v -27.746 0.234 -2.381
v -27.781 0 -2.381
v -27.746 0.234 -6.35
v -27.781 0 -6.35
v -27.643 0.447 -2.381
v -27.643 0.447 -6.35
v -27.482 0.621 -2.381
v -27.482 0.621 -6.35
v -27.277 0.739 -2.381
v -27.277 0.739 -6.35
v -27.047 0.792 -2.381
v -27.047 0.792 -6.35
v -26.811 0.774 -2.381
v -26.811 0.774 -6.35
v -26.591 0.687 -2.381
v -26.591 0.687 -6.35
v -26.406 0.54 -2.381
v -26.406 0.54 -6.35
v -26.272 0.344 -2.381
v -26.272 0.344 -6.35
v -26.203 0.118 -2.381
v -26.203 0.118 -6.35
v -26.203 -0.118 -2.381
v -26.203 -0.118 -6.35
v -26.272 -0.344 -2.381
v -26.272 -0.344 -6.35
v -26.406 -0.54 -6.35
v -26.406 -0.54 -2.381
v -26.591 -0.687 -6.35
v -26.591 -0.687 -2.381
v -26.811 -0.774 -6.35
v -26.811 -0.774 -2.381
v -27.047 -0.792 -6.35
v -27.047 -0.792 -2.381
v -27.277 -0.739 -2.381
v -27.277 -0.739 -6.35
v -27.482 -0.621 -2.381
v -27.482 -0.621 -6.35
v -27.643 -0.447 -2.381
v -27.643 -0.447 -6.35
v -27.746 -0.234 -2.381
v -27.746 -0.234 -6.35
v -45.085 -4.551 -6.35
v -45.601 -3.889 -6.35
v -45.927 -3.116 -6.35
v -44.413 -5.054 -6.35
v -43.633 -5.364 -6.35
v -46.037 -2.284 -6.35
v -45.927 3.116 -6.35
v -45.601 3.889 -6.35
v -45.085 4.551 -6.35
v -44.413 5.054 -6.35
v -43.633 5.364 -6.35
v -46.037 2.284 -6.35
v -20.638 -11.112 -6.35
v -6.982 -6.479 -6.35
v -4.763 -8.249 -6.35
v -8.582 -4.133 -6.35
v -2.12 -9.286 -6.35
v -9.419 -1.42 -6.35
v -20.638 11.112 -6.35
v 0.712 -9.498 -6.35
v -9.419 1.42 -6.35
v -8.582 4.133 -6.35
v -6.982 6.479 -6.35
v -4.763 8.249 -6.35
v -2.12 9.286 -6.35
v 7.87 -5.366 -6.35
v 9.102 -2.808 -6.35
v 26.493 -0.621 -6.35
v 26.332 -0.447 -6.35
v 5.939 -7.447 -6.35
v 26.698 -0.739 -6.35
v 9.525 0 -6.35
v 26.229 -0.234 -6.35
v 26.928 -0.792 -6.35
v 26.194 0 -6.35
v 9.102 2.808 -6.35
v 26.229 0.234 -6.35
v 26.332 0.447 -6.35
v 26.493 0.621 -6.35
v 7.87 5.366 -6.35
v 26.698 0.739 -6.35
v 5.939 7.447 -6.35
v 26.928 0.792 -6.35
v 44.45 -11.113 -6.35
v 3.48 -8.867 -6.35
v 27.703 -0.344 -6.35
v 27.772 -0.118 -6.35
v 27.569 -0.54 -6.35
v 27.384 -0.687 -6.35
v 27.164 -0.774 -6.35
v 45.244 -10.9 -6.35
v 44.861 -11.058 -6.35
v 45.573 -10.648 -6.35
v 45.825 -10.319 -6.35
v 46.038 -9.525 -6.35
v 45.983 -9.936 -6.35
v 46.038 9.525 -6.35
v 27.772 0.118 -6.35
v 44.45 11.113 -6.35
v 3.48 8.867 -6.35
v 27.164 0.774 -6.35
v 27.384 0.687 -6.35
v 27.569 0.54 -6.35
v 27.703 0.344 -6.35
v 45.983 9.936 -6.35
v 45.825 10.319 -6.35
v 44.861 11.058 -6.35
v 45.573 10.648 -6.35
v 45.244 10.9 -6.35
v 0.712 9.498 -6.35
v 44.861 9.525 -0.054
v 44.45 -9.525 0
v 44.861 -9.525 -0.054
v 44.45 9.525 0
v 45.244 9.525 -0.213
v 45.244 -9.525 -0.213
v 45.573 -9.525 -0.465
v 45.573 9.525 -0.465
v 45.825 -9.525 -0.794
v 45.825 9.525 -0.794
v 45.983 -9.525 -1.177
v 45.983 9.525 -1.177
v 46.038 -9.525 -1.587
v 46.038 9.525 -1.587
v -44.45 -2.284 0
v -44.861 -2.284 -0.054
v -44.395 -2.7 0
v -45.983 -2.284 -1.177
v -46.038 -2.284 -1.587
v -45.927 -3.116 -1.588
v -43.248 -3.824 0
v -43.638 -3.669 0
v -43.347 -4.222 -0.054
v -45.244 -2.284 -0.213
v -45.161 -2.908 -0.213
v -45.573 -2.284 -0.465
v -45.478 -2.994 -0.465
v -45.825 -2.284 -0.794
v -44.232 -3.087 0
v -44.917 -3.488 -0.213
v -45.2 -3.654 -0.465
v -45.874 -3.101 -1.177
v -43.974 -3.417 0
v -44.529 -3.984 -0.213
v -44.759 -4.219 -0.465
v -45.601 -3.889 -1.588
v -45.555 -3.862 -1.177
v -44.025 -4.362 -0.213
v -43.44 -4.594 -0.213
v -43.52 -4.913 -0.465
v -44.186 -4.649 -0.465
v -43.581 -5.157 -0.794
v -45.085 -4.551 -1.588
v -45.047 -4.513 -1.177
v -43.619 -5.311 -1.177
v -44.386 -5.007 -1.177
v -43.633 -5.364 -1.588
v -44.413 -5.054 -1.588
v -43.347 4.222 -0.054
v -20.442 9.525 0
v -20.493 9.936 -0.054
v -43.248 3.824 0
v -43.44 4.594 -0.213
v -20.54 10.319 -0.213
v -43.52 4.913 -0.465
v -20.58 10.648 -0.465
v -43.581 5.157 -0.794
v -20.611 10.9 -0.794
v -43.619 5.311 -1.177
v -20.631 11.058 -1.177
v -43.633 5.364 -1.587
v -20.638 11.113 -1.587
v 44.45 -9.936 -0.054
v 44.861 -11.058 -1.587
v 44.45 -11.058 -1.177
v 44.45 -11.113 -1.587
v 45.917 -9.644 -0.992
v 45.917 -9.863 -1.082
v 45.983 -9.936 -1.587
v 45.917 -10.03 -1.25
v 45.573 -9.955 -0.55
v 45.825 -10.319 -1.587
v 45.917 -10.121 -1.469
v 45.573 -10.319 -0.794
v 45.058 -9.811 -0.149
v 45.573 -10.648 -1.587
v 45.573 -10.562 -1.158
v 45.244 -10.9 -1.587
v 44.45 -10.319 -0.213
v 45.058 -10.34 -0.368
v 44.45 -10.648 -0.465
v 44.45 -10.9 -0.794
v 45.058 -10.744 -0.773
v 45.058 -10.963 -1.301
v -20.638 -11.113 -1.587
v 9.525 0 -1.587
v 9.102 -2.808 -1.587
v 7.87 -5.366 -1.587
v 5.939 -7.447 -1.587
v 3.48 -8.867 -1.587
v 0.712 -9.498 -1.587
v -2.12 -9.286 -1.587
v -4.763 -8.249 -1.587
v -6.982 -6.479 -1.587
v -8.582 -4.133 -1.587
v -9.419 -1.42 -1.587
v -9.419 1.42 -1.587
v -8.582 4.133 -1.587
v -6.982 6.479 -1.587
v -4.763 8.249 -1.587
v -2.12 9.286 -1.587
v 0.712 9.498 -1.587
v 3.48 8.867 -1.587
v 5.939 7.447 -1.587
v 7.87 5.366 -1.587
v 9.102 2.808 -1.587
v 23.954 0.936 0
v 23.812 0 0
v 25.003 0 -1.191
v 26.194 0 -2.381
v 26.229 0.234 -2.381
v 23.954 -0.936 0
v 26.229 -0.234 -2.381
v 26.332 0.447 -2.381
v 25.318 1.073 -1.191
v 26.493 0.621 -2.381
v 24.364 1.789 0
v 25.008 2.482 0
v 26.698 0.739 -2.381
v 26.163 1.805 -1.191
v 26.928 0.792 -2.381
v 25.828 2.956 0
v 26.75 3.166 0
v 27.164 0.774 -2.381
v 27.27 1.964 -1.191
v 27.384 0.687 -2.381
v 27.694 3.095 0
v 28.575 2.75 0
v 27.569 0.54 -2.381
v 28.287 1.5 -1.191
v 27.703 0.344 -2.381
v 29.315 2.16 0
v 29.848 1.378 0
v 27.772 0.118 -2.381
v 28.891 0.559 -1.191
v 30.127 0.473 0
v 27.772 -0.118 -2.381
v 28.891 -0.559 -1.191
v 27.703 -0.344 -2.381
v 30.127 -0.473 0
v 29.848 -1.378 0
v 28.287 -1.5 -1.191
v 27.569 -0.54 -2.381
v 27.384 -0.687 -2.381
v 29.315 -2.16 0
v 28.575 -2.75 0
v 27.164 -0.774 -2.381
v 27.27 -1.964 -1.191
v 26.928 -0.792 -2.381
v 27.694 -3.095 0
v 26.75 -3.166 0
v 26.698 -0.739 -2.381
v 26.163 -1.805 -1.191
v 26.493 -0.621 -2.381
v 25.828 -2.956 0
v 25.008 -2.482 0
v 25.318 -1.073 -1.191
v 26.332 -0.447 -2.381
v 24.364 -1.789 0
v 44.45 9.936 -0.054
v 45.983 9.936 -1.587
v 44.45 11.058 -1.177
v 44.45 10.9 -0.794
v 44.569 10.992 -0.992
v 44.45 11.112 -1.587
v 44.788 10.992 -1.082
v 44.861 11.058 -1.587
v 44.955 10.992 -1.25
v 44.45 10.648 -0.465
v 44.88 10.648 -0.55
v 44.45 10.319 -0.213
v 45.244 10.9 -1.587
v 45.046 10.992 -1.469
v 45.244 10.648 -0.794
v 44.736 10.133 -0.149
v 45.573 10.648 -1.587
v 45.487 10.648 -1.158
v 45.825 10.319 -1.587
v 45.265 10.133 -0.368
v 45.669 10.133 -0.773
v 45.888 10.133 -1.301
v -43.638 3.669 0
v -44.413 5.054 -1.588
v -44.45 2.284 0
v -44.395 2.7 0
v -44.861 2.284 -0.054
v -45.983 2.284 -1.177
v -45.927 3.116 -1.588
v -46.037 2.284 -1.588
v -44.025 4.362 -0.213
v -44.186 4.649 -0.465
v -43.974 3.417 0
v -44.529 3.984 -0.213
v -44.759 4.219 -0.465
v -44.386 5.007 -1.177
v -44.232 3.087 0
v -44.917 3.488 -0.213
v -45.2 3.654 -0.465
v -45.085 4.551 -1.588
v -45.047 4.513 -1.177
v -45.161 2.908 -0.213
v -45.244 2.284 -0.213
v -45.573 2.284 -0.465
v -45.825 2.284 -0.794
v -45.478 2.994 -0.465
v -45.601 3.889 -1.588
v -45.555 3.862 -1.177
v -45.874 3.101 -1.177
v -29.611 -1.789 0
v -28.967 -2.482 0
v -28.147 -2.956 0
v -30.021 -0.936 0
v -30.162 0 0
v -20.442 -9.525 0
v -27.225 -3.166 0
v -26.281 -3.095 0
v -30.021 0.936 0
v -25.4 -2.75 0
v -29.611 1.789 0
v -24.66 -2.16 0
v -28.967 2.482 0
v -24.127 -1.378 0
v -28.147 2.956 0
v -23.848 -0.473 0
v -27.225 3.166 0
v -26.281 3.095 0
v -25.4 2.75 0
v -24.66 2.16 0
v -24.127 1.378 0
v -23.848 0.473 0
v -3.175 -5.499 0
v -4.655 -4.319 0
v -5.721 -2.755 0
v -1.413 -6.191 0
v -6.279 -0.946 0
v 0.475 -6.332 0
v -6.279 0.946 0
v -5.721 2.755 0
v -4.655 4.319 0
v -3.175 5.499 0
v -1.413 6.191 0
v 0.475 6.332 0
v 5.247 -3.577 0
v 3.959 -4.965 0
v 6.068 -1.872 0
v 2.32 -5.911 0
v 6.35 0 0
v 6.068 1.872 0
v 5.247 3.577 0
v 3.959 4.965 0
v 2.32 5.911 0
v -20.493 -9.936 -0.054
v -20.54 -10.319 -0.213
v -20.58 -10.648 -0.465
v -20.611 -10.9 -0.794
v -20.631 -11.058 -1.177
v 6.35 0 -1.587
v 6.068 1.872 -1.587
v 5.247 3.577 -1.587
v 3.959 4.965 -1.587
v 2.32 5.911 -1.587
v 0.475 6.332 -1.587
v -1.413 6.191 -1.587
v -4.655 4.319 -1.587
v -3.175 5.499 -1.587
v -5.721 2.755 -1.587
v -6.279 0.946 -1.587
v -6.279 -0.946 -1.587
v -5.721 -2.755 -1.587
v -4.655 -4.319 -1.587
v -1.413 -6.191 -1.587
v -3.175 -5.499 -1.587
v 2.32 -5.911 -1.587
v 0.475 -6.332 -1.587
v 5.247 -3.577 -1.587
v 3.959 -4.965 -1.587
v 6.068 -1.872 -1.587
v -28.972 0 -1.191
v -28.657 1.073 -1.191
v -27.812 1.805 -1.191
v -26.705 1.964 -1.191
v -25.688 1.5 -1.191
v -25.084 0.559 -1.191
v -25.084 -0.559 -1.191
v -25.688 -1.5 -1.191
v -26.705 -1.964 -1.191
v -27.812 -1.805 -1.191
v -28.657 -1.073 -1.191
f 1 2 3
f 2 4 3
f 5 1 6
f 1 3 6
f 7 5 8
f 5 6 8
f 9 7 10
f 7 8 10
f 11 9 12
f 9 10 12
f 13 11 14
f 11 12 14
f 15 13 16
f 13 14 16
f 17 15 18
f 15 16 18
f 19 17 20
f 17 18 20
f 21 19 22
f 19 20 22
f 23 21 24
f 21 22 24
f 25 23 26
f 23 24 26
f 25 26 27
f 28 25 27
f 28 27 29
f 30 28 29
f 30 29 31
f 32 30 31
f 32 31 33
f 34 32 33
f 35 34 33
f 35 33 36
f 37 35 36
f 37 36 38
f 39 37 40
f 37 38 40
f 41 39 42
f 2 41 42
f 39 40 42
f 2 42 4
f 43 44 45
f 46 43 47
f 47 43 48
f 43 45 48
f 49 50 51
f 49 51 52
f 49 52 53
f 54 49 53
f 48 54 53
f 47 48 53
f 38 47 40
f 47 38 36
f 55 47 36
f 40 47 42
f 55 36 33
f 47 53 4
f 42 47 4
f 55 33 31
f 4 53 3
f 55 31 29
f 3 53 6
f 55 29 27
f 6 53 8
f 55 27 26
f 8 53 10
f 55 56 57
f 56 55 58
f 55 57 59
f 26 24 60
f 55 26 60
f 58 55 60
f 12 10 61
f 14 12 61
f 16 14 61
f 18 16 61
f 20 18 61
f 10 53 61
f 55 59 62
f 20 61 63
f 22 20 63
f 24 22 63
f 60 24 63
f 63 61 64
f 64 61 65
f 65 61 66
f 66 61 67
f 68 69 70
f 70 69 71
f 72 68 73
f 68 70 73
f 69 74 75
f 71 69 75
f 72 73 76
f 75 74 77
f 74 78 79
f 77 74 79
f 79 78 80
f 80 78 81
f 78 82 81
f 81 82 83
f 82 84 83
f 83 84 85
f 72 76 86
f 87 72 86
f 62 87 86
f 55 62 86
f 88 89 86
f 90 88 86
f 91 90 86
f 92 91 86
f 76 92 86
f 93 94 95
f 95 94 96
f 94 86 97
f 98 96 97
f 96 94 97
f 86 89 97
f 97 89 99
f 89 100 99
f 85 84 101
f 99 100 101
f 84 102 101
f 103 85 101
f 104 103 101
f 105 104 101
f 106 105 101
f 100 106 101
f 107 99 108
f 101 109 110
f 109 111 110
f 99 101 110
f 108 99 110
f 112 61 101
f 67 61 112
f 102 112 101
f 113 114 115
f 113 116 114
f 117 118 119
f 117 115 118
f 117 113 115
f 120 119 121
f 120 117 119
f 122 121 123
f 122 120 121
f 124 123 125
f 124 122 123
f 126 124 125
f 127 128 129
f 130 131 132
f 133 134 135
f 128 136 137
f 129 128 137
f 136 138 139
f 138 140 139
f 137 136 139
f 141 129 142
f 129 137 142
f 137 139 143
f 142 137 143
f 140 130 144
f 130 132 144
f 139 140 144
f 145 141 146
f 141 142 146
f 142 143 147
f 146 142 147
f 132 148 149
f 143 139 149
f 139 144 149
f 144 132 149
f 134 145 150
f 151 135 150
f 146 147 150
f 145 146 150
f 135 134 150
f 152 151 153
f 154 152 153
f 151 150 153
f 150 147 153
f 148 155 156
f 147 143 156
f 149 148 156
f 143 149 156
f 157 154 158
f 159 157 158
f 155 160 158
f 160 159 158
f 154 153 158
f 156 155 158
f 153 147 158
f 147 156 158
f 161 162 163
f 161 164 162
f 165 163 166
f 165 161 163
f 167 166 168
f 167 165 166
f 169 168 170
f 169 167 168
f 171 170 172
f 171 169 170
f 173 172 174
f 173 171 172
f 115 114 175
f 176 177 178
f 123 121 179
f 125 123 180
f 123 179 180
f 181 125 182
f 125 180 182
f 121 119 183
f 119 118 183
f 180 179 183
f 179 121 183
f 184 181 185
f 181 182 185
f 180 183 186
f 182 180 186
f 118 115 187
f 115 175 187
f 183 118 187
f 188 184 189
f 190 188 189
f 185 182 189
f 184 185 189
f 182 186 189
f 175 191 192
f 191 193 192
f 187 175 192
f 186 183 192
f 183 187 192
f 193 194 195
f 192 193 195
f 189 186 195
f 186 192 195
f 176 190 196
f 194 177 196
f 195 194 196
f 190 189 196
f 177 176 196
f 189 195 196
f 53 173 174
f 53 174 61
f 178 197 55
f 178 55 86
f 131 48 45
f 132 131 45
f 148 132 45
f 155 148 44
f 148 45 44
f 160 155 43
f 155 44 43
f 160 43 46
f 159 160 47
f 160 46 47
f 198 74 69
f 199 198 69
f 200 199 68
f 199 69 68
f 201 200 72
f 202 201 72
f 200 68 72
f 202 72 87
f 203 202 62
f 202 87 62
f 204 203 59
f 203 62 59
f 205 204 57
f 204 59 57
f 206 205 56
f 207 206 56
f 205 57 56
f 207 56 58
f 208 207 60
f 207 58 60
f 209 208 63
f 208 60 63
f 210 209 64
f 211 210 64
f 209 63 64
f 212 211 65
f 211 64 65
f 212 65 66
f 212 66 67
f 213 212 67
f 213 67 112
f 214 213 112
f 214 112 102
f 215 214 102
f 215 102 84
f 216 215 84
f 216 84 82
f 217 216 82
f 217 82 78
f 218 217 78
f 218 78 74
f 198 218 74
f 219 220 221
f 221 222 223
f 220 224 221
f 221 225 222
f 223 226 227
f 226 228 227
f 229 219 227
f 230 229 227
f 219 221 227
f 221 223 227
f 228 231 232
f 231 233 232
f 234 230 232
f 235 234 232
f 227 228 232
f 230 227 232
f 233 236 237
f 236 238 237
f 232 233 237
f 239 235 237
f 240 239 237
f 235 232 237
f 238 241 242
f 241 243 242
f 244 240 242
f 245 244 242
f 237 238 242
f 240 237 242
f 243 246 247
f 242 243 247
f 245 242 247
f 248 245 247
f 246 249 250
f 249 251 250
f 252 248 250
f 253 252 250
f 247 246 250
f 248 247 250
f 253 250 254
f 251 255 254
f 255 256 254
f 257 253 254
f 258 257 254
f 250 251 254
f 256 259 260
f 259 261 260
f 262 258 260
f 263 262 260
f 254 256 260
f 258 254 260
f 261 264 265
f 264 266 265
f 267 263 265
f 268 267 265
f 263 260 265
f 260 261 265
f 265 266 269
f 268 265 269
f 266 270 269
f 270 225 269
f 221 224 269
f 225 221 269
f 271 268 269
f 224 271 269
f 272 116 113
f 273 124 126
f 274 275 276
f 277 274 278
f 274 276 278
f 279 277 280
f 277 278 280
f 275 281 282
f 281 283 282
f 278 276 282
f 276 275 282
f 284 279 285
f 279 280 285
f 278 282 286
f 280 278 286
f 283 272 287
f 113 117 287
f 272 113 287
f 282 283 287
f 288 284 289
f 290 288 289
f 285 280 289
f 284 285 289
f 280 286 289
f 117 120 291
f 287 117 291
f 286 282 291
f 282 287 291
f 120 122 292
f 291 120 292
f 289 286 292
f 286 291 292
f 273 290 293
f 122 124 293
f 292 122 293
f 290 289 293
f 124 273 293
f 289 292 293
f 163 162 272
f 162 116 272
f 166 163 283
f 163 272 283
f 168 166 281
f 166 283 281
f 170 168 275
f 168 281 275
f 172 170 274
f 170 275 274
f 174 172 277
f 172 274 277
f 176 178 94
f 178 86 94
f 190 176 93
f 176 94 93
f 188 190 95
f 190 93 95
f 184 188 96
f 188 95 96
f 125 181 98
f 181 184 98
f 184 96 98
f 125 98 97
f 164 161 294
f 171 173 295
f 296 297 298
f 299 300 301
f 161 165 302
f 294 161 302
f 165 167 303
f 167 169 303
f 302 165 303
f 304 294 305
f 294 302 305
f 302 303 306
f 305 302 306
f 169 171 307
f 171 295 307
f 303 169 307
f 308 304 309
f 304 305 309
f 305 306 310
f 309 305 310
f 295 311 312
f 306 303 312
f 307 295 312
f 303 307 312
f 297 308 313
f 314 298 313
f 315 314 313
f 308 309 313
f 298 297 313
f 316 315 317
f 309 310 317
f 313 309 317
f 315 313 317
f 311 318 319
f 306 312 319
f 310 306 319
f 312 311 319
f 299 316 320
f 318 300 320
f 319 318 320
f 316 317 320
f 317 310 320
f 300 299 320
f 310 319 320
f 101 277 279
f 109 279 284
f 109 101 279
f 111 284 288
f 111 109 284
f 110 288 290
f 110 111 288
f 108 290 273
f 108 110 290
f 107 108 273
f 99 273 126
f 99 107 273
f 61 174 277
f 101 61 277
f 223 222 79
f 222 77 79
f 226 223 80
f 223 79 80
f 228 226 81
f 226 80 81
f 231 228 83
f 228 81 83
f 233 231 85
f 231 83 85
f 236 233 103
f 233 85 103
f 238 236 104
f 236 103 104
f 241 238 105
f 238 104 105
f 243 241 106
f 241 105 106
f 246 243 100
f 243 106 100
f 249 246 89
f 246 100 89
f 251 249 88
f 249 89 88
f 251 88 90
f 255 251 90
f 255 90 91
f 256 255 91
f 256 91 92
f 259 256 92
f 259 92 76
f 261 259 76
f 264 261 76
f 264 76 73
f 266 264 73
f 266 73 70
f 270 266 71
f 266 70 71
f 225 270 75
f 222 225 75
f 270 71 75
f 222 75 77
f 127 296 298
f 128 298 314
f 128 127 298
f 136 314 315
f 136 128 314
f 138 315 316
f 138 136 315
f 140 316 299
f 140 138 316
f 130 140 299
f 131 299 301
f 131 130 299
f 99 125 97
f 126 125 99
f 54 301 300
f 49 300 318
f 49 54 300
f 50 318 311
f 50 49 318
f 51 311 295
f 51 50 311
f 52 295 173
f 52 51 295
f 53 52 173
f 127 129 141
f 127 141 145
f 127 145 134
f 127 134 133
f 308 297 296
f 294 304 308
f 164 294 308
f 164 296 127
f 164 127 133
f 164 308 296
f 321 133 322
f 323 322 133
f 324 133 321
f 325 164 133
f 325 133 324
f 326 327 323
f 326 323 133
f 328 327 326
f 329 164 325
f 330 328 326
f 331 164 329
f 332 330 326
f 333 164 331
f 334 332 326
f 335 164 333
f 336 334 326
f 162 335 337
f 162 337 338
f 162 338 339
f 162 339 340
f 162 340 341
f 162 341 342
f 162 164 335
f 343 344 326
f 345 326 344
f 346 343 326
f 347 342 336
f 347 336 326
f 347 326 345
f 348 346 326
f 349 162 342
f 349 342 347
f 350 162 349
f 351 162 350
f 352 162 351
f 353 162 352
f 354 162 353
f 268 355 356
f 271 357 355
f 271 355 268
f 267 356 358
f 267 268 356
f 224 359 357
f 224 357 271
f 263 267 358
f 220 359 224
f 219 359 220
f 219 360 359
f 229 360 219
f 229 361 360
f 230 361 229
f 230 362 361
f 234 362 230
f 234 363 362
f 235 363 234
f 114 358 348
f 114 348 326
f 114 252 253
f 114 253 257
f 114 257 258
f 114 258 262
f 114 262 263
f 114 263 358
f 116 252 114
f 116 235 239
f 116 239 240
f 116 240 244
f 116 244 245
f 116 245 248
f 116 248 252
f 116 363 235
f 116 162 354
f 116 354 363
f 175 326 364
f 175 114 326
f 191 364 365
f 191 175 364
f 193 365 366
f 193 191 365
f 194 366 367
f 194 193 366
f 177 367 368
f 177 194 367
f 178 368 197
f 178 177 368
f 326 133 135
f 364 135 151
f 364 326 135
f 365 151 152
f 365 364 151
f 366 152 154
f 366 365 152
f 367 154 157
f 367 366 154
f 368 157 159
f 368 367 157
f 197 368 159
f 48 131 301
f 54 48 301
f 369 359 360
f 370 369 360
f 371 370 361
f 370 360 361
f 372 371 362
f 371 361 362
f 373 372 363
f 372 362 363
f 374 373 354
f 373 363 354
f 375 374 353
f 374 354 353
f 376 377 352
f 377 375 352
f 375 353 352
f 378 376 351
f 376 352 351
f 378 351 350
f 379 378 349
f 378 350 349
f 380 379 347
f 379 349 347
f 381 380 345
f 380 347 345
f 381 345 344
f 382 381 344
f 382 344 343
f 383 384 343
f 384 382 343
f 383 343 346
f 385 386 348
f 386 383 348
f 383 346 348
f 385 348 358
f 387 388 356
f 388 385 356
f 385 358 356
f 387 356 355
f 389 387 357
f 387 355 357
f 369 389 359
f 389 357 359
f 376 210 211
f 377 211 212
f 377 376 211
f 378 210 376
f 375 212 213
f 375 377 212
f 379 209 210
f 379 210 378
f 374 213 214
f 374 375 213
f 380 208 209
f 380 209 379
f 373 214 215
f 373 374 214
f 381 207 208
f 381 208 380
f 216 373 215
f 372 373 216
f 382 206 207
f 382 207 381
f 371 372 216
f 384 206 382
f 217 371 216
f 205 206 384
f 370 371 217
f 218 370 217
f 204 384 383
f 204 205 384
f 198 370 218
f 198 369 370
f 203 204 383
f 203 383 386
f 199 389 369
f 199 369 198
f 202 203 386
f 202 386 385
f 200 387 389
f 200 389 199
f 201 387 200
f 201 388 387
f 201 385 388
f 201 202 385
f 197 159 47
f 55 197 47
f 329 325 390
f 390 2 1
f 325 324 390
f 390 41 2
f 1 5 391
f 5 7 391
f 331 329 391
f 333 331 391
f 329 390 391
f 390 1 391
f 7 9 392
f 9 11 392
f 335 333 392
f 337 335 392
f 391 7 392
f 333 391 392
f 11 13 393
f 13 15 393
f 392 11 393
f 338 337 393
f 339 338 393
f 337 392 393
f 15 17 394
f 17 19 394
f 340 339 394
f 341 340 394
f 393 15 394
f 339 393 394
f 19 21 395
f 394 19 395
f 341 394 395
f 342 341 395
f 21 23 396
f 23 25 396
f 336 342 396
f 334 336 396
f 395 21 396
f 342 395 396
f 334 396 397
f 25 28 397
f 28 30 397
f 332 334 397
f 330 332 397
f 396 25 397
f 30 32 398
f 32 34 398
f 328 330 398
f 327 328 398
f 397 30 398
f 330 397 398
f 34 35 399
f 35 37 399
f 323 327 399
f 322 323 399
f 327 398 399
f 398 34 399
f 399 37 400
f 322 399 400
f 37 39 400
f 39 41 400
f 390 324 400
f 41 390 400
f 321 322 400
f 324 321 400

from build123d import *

# Parameters (mm, degrees)
F0_W           = 92.075
F0_H           = 22.225
F0_R           = 6.35
F1_DEPTH       = 6.35
F3_D           = 1.5875
F3_CSINK_D     = 6.35
F3_CSINK_ANGLE = 90
F6_D           = 12.7
F6_CBORE_D     = 19.05
F6_CBORE_DEPTH = 4.7625
F7_SIZE2       = 25.4
F7_SIZE        = 6.35
F8_R           = 3.175
F9_R           = 1.5875


with BuildPart() as f1:
    # F0 (on Top) → F1 (new body)
    with BuildSketch(Plane.XY):
        Rectangle(F0_W, F0_H)
        Circle(F0_R, mode=Mode.SUBTRACT)
    extrude(amount=-F1_DEPTH)

    # F3 (through all)
    with Locations(Plane.XY):
        with Locations((26.9875, 0), (-26.9875, 0)):
            CounterSinkHole(F3_D / 2, F3_CSINK_D / 2, counter_sink_angle=F3_CSINK_ANGLE)

    # F6 (through all)
    with Locations(Plane(origin=(0, 0, -6.35), x_dir=(1, 0, 0), z_dir=(0, 0, -1))):
        with Locations((0, 0)):
            CounterBoreHole(F6_D / 2, F6_CBORE_D / 2, F6_CBORE_DEPTH)

    # F7
    f7_edges = [f1.edges().sort_by_distance(p)[0] for p in [
        (-46.0375, -11.1125, -3.175),
        (-46.0375, 11.1125, -3.175),
    ]]
    f7_side = f1.faces().sort_by_distance((-46.0375, 0, -3.175))[0]
    chamfer(f7_edges, length=F7_SIZE, length2=F7_SIZE2, reference=f7_side)

    # F8
    f8_edges = [f1.edges().sort_by_distance(p)[0] for p in [
        (-46.0375, -4.7625, -3.175),
        (-46.0375, 4.7625, -3.175),
    ]]
    fillet(f8_edges, radius=F8_R)

    # F9
    f9_edges = [f1.edges().sort_by_distance(p)[0] for p in [
        (12.7, -11.1125, 0),
        (46.0375, 0, 0),
        (12.7, 11.1125, 0),
        (-32.135025, -8.238119, 0),
        (-32.135025, 8.238119, 0),
        (-45.365052, 4.237469, 0),
        (-46.0375, 0, 0),
        (-45.365052, -4.237469, 0),
        (46.0375, -11.1125, -3.175),
        (46.0375, 11.1125, -3.175),
    ]]
    fillet(f9_edges, radius=F9_R)


solid = f1.part
